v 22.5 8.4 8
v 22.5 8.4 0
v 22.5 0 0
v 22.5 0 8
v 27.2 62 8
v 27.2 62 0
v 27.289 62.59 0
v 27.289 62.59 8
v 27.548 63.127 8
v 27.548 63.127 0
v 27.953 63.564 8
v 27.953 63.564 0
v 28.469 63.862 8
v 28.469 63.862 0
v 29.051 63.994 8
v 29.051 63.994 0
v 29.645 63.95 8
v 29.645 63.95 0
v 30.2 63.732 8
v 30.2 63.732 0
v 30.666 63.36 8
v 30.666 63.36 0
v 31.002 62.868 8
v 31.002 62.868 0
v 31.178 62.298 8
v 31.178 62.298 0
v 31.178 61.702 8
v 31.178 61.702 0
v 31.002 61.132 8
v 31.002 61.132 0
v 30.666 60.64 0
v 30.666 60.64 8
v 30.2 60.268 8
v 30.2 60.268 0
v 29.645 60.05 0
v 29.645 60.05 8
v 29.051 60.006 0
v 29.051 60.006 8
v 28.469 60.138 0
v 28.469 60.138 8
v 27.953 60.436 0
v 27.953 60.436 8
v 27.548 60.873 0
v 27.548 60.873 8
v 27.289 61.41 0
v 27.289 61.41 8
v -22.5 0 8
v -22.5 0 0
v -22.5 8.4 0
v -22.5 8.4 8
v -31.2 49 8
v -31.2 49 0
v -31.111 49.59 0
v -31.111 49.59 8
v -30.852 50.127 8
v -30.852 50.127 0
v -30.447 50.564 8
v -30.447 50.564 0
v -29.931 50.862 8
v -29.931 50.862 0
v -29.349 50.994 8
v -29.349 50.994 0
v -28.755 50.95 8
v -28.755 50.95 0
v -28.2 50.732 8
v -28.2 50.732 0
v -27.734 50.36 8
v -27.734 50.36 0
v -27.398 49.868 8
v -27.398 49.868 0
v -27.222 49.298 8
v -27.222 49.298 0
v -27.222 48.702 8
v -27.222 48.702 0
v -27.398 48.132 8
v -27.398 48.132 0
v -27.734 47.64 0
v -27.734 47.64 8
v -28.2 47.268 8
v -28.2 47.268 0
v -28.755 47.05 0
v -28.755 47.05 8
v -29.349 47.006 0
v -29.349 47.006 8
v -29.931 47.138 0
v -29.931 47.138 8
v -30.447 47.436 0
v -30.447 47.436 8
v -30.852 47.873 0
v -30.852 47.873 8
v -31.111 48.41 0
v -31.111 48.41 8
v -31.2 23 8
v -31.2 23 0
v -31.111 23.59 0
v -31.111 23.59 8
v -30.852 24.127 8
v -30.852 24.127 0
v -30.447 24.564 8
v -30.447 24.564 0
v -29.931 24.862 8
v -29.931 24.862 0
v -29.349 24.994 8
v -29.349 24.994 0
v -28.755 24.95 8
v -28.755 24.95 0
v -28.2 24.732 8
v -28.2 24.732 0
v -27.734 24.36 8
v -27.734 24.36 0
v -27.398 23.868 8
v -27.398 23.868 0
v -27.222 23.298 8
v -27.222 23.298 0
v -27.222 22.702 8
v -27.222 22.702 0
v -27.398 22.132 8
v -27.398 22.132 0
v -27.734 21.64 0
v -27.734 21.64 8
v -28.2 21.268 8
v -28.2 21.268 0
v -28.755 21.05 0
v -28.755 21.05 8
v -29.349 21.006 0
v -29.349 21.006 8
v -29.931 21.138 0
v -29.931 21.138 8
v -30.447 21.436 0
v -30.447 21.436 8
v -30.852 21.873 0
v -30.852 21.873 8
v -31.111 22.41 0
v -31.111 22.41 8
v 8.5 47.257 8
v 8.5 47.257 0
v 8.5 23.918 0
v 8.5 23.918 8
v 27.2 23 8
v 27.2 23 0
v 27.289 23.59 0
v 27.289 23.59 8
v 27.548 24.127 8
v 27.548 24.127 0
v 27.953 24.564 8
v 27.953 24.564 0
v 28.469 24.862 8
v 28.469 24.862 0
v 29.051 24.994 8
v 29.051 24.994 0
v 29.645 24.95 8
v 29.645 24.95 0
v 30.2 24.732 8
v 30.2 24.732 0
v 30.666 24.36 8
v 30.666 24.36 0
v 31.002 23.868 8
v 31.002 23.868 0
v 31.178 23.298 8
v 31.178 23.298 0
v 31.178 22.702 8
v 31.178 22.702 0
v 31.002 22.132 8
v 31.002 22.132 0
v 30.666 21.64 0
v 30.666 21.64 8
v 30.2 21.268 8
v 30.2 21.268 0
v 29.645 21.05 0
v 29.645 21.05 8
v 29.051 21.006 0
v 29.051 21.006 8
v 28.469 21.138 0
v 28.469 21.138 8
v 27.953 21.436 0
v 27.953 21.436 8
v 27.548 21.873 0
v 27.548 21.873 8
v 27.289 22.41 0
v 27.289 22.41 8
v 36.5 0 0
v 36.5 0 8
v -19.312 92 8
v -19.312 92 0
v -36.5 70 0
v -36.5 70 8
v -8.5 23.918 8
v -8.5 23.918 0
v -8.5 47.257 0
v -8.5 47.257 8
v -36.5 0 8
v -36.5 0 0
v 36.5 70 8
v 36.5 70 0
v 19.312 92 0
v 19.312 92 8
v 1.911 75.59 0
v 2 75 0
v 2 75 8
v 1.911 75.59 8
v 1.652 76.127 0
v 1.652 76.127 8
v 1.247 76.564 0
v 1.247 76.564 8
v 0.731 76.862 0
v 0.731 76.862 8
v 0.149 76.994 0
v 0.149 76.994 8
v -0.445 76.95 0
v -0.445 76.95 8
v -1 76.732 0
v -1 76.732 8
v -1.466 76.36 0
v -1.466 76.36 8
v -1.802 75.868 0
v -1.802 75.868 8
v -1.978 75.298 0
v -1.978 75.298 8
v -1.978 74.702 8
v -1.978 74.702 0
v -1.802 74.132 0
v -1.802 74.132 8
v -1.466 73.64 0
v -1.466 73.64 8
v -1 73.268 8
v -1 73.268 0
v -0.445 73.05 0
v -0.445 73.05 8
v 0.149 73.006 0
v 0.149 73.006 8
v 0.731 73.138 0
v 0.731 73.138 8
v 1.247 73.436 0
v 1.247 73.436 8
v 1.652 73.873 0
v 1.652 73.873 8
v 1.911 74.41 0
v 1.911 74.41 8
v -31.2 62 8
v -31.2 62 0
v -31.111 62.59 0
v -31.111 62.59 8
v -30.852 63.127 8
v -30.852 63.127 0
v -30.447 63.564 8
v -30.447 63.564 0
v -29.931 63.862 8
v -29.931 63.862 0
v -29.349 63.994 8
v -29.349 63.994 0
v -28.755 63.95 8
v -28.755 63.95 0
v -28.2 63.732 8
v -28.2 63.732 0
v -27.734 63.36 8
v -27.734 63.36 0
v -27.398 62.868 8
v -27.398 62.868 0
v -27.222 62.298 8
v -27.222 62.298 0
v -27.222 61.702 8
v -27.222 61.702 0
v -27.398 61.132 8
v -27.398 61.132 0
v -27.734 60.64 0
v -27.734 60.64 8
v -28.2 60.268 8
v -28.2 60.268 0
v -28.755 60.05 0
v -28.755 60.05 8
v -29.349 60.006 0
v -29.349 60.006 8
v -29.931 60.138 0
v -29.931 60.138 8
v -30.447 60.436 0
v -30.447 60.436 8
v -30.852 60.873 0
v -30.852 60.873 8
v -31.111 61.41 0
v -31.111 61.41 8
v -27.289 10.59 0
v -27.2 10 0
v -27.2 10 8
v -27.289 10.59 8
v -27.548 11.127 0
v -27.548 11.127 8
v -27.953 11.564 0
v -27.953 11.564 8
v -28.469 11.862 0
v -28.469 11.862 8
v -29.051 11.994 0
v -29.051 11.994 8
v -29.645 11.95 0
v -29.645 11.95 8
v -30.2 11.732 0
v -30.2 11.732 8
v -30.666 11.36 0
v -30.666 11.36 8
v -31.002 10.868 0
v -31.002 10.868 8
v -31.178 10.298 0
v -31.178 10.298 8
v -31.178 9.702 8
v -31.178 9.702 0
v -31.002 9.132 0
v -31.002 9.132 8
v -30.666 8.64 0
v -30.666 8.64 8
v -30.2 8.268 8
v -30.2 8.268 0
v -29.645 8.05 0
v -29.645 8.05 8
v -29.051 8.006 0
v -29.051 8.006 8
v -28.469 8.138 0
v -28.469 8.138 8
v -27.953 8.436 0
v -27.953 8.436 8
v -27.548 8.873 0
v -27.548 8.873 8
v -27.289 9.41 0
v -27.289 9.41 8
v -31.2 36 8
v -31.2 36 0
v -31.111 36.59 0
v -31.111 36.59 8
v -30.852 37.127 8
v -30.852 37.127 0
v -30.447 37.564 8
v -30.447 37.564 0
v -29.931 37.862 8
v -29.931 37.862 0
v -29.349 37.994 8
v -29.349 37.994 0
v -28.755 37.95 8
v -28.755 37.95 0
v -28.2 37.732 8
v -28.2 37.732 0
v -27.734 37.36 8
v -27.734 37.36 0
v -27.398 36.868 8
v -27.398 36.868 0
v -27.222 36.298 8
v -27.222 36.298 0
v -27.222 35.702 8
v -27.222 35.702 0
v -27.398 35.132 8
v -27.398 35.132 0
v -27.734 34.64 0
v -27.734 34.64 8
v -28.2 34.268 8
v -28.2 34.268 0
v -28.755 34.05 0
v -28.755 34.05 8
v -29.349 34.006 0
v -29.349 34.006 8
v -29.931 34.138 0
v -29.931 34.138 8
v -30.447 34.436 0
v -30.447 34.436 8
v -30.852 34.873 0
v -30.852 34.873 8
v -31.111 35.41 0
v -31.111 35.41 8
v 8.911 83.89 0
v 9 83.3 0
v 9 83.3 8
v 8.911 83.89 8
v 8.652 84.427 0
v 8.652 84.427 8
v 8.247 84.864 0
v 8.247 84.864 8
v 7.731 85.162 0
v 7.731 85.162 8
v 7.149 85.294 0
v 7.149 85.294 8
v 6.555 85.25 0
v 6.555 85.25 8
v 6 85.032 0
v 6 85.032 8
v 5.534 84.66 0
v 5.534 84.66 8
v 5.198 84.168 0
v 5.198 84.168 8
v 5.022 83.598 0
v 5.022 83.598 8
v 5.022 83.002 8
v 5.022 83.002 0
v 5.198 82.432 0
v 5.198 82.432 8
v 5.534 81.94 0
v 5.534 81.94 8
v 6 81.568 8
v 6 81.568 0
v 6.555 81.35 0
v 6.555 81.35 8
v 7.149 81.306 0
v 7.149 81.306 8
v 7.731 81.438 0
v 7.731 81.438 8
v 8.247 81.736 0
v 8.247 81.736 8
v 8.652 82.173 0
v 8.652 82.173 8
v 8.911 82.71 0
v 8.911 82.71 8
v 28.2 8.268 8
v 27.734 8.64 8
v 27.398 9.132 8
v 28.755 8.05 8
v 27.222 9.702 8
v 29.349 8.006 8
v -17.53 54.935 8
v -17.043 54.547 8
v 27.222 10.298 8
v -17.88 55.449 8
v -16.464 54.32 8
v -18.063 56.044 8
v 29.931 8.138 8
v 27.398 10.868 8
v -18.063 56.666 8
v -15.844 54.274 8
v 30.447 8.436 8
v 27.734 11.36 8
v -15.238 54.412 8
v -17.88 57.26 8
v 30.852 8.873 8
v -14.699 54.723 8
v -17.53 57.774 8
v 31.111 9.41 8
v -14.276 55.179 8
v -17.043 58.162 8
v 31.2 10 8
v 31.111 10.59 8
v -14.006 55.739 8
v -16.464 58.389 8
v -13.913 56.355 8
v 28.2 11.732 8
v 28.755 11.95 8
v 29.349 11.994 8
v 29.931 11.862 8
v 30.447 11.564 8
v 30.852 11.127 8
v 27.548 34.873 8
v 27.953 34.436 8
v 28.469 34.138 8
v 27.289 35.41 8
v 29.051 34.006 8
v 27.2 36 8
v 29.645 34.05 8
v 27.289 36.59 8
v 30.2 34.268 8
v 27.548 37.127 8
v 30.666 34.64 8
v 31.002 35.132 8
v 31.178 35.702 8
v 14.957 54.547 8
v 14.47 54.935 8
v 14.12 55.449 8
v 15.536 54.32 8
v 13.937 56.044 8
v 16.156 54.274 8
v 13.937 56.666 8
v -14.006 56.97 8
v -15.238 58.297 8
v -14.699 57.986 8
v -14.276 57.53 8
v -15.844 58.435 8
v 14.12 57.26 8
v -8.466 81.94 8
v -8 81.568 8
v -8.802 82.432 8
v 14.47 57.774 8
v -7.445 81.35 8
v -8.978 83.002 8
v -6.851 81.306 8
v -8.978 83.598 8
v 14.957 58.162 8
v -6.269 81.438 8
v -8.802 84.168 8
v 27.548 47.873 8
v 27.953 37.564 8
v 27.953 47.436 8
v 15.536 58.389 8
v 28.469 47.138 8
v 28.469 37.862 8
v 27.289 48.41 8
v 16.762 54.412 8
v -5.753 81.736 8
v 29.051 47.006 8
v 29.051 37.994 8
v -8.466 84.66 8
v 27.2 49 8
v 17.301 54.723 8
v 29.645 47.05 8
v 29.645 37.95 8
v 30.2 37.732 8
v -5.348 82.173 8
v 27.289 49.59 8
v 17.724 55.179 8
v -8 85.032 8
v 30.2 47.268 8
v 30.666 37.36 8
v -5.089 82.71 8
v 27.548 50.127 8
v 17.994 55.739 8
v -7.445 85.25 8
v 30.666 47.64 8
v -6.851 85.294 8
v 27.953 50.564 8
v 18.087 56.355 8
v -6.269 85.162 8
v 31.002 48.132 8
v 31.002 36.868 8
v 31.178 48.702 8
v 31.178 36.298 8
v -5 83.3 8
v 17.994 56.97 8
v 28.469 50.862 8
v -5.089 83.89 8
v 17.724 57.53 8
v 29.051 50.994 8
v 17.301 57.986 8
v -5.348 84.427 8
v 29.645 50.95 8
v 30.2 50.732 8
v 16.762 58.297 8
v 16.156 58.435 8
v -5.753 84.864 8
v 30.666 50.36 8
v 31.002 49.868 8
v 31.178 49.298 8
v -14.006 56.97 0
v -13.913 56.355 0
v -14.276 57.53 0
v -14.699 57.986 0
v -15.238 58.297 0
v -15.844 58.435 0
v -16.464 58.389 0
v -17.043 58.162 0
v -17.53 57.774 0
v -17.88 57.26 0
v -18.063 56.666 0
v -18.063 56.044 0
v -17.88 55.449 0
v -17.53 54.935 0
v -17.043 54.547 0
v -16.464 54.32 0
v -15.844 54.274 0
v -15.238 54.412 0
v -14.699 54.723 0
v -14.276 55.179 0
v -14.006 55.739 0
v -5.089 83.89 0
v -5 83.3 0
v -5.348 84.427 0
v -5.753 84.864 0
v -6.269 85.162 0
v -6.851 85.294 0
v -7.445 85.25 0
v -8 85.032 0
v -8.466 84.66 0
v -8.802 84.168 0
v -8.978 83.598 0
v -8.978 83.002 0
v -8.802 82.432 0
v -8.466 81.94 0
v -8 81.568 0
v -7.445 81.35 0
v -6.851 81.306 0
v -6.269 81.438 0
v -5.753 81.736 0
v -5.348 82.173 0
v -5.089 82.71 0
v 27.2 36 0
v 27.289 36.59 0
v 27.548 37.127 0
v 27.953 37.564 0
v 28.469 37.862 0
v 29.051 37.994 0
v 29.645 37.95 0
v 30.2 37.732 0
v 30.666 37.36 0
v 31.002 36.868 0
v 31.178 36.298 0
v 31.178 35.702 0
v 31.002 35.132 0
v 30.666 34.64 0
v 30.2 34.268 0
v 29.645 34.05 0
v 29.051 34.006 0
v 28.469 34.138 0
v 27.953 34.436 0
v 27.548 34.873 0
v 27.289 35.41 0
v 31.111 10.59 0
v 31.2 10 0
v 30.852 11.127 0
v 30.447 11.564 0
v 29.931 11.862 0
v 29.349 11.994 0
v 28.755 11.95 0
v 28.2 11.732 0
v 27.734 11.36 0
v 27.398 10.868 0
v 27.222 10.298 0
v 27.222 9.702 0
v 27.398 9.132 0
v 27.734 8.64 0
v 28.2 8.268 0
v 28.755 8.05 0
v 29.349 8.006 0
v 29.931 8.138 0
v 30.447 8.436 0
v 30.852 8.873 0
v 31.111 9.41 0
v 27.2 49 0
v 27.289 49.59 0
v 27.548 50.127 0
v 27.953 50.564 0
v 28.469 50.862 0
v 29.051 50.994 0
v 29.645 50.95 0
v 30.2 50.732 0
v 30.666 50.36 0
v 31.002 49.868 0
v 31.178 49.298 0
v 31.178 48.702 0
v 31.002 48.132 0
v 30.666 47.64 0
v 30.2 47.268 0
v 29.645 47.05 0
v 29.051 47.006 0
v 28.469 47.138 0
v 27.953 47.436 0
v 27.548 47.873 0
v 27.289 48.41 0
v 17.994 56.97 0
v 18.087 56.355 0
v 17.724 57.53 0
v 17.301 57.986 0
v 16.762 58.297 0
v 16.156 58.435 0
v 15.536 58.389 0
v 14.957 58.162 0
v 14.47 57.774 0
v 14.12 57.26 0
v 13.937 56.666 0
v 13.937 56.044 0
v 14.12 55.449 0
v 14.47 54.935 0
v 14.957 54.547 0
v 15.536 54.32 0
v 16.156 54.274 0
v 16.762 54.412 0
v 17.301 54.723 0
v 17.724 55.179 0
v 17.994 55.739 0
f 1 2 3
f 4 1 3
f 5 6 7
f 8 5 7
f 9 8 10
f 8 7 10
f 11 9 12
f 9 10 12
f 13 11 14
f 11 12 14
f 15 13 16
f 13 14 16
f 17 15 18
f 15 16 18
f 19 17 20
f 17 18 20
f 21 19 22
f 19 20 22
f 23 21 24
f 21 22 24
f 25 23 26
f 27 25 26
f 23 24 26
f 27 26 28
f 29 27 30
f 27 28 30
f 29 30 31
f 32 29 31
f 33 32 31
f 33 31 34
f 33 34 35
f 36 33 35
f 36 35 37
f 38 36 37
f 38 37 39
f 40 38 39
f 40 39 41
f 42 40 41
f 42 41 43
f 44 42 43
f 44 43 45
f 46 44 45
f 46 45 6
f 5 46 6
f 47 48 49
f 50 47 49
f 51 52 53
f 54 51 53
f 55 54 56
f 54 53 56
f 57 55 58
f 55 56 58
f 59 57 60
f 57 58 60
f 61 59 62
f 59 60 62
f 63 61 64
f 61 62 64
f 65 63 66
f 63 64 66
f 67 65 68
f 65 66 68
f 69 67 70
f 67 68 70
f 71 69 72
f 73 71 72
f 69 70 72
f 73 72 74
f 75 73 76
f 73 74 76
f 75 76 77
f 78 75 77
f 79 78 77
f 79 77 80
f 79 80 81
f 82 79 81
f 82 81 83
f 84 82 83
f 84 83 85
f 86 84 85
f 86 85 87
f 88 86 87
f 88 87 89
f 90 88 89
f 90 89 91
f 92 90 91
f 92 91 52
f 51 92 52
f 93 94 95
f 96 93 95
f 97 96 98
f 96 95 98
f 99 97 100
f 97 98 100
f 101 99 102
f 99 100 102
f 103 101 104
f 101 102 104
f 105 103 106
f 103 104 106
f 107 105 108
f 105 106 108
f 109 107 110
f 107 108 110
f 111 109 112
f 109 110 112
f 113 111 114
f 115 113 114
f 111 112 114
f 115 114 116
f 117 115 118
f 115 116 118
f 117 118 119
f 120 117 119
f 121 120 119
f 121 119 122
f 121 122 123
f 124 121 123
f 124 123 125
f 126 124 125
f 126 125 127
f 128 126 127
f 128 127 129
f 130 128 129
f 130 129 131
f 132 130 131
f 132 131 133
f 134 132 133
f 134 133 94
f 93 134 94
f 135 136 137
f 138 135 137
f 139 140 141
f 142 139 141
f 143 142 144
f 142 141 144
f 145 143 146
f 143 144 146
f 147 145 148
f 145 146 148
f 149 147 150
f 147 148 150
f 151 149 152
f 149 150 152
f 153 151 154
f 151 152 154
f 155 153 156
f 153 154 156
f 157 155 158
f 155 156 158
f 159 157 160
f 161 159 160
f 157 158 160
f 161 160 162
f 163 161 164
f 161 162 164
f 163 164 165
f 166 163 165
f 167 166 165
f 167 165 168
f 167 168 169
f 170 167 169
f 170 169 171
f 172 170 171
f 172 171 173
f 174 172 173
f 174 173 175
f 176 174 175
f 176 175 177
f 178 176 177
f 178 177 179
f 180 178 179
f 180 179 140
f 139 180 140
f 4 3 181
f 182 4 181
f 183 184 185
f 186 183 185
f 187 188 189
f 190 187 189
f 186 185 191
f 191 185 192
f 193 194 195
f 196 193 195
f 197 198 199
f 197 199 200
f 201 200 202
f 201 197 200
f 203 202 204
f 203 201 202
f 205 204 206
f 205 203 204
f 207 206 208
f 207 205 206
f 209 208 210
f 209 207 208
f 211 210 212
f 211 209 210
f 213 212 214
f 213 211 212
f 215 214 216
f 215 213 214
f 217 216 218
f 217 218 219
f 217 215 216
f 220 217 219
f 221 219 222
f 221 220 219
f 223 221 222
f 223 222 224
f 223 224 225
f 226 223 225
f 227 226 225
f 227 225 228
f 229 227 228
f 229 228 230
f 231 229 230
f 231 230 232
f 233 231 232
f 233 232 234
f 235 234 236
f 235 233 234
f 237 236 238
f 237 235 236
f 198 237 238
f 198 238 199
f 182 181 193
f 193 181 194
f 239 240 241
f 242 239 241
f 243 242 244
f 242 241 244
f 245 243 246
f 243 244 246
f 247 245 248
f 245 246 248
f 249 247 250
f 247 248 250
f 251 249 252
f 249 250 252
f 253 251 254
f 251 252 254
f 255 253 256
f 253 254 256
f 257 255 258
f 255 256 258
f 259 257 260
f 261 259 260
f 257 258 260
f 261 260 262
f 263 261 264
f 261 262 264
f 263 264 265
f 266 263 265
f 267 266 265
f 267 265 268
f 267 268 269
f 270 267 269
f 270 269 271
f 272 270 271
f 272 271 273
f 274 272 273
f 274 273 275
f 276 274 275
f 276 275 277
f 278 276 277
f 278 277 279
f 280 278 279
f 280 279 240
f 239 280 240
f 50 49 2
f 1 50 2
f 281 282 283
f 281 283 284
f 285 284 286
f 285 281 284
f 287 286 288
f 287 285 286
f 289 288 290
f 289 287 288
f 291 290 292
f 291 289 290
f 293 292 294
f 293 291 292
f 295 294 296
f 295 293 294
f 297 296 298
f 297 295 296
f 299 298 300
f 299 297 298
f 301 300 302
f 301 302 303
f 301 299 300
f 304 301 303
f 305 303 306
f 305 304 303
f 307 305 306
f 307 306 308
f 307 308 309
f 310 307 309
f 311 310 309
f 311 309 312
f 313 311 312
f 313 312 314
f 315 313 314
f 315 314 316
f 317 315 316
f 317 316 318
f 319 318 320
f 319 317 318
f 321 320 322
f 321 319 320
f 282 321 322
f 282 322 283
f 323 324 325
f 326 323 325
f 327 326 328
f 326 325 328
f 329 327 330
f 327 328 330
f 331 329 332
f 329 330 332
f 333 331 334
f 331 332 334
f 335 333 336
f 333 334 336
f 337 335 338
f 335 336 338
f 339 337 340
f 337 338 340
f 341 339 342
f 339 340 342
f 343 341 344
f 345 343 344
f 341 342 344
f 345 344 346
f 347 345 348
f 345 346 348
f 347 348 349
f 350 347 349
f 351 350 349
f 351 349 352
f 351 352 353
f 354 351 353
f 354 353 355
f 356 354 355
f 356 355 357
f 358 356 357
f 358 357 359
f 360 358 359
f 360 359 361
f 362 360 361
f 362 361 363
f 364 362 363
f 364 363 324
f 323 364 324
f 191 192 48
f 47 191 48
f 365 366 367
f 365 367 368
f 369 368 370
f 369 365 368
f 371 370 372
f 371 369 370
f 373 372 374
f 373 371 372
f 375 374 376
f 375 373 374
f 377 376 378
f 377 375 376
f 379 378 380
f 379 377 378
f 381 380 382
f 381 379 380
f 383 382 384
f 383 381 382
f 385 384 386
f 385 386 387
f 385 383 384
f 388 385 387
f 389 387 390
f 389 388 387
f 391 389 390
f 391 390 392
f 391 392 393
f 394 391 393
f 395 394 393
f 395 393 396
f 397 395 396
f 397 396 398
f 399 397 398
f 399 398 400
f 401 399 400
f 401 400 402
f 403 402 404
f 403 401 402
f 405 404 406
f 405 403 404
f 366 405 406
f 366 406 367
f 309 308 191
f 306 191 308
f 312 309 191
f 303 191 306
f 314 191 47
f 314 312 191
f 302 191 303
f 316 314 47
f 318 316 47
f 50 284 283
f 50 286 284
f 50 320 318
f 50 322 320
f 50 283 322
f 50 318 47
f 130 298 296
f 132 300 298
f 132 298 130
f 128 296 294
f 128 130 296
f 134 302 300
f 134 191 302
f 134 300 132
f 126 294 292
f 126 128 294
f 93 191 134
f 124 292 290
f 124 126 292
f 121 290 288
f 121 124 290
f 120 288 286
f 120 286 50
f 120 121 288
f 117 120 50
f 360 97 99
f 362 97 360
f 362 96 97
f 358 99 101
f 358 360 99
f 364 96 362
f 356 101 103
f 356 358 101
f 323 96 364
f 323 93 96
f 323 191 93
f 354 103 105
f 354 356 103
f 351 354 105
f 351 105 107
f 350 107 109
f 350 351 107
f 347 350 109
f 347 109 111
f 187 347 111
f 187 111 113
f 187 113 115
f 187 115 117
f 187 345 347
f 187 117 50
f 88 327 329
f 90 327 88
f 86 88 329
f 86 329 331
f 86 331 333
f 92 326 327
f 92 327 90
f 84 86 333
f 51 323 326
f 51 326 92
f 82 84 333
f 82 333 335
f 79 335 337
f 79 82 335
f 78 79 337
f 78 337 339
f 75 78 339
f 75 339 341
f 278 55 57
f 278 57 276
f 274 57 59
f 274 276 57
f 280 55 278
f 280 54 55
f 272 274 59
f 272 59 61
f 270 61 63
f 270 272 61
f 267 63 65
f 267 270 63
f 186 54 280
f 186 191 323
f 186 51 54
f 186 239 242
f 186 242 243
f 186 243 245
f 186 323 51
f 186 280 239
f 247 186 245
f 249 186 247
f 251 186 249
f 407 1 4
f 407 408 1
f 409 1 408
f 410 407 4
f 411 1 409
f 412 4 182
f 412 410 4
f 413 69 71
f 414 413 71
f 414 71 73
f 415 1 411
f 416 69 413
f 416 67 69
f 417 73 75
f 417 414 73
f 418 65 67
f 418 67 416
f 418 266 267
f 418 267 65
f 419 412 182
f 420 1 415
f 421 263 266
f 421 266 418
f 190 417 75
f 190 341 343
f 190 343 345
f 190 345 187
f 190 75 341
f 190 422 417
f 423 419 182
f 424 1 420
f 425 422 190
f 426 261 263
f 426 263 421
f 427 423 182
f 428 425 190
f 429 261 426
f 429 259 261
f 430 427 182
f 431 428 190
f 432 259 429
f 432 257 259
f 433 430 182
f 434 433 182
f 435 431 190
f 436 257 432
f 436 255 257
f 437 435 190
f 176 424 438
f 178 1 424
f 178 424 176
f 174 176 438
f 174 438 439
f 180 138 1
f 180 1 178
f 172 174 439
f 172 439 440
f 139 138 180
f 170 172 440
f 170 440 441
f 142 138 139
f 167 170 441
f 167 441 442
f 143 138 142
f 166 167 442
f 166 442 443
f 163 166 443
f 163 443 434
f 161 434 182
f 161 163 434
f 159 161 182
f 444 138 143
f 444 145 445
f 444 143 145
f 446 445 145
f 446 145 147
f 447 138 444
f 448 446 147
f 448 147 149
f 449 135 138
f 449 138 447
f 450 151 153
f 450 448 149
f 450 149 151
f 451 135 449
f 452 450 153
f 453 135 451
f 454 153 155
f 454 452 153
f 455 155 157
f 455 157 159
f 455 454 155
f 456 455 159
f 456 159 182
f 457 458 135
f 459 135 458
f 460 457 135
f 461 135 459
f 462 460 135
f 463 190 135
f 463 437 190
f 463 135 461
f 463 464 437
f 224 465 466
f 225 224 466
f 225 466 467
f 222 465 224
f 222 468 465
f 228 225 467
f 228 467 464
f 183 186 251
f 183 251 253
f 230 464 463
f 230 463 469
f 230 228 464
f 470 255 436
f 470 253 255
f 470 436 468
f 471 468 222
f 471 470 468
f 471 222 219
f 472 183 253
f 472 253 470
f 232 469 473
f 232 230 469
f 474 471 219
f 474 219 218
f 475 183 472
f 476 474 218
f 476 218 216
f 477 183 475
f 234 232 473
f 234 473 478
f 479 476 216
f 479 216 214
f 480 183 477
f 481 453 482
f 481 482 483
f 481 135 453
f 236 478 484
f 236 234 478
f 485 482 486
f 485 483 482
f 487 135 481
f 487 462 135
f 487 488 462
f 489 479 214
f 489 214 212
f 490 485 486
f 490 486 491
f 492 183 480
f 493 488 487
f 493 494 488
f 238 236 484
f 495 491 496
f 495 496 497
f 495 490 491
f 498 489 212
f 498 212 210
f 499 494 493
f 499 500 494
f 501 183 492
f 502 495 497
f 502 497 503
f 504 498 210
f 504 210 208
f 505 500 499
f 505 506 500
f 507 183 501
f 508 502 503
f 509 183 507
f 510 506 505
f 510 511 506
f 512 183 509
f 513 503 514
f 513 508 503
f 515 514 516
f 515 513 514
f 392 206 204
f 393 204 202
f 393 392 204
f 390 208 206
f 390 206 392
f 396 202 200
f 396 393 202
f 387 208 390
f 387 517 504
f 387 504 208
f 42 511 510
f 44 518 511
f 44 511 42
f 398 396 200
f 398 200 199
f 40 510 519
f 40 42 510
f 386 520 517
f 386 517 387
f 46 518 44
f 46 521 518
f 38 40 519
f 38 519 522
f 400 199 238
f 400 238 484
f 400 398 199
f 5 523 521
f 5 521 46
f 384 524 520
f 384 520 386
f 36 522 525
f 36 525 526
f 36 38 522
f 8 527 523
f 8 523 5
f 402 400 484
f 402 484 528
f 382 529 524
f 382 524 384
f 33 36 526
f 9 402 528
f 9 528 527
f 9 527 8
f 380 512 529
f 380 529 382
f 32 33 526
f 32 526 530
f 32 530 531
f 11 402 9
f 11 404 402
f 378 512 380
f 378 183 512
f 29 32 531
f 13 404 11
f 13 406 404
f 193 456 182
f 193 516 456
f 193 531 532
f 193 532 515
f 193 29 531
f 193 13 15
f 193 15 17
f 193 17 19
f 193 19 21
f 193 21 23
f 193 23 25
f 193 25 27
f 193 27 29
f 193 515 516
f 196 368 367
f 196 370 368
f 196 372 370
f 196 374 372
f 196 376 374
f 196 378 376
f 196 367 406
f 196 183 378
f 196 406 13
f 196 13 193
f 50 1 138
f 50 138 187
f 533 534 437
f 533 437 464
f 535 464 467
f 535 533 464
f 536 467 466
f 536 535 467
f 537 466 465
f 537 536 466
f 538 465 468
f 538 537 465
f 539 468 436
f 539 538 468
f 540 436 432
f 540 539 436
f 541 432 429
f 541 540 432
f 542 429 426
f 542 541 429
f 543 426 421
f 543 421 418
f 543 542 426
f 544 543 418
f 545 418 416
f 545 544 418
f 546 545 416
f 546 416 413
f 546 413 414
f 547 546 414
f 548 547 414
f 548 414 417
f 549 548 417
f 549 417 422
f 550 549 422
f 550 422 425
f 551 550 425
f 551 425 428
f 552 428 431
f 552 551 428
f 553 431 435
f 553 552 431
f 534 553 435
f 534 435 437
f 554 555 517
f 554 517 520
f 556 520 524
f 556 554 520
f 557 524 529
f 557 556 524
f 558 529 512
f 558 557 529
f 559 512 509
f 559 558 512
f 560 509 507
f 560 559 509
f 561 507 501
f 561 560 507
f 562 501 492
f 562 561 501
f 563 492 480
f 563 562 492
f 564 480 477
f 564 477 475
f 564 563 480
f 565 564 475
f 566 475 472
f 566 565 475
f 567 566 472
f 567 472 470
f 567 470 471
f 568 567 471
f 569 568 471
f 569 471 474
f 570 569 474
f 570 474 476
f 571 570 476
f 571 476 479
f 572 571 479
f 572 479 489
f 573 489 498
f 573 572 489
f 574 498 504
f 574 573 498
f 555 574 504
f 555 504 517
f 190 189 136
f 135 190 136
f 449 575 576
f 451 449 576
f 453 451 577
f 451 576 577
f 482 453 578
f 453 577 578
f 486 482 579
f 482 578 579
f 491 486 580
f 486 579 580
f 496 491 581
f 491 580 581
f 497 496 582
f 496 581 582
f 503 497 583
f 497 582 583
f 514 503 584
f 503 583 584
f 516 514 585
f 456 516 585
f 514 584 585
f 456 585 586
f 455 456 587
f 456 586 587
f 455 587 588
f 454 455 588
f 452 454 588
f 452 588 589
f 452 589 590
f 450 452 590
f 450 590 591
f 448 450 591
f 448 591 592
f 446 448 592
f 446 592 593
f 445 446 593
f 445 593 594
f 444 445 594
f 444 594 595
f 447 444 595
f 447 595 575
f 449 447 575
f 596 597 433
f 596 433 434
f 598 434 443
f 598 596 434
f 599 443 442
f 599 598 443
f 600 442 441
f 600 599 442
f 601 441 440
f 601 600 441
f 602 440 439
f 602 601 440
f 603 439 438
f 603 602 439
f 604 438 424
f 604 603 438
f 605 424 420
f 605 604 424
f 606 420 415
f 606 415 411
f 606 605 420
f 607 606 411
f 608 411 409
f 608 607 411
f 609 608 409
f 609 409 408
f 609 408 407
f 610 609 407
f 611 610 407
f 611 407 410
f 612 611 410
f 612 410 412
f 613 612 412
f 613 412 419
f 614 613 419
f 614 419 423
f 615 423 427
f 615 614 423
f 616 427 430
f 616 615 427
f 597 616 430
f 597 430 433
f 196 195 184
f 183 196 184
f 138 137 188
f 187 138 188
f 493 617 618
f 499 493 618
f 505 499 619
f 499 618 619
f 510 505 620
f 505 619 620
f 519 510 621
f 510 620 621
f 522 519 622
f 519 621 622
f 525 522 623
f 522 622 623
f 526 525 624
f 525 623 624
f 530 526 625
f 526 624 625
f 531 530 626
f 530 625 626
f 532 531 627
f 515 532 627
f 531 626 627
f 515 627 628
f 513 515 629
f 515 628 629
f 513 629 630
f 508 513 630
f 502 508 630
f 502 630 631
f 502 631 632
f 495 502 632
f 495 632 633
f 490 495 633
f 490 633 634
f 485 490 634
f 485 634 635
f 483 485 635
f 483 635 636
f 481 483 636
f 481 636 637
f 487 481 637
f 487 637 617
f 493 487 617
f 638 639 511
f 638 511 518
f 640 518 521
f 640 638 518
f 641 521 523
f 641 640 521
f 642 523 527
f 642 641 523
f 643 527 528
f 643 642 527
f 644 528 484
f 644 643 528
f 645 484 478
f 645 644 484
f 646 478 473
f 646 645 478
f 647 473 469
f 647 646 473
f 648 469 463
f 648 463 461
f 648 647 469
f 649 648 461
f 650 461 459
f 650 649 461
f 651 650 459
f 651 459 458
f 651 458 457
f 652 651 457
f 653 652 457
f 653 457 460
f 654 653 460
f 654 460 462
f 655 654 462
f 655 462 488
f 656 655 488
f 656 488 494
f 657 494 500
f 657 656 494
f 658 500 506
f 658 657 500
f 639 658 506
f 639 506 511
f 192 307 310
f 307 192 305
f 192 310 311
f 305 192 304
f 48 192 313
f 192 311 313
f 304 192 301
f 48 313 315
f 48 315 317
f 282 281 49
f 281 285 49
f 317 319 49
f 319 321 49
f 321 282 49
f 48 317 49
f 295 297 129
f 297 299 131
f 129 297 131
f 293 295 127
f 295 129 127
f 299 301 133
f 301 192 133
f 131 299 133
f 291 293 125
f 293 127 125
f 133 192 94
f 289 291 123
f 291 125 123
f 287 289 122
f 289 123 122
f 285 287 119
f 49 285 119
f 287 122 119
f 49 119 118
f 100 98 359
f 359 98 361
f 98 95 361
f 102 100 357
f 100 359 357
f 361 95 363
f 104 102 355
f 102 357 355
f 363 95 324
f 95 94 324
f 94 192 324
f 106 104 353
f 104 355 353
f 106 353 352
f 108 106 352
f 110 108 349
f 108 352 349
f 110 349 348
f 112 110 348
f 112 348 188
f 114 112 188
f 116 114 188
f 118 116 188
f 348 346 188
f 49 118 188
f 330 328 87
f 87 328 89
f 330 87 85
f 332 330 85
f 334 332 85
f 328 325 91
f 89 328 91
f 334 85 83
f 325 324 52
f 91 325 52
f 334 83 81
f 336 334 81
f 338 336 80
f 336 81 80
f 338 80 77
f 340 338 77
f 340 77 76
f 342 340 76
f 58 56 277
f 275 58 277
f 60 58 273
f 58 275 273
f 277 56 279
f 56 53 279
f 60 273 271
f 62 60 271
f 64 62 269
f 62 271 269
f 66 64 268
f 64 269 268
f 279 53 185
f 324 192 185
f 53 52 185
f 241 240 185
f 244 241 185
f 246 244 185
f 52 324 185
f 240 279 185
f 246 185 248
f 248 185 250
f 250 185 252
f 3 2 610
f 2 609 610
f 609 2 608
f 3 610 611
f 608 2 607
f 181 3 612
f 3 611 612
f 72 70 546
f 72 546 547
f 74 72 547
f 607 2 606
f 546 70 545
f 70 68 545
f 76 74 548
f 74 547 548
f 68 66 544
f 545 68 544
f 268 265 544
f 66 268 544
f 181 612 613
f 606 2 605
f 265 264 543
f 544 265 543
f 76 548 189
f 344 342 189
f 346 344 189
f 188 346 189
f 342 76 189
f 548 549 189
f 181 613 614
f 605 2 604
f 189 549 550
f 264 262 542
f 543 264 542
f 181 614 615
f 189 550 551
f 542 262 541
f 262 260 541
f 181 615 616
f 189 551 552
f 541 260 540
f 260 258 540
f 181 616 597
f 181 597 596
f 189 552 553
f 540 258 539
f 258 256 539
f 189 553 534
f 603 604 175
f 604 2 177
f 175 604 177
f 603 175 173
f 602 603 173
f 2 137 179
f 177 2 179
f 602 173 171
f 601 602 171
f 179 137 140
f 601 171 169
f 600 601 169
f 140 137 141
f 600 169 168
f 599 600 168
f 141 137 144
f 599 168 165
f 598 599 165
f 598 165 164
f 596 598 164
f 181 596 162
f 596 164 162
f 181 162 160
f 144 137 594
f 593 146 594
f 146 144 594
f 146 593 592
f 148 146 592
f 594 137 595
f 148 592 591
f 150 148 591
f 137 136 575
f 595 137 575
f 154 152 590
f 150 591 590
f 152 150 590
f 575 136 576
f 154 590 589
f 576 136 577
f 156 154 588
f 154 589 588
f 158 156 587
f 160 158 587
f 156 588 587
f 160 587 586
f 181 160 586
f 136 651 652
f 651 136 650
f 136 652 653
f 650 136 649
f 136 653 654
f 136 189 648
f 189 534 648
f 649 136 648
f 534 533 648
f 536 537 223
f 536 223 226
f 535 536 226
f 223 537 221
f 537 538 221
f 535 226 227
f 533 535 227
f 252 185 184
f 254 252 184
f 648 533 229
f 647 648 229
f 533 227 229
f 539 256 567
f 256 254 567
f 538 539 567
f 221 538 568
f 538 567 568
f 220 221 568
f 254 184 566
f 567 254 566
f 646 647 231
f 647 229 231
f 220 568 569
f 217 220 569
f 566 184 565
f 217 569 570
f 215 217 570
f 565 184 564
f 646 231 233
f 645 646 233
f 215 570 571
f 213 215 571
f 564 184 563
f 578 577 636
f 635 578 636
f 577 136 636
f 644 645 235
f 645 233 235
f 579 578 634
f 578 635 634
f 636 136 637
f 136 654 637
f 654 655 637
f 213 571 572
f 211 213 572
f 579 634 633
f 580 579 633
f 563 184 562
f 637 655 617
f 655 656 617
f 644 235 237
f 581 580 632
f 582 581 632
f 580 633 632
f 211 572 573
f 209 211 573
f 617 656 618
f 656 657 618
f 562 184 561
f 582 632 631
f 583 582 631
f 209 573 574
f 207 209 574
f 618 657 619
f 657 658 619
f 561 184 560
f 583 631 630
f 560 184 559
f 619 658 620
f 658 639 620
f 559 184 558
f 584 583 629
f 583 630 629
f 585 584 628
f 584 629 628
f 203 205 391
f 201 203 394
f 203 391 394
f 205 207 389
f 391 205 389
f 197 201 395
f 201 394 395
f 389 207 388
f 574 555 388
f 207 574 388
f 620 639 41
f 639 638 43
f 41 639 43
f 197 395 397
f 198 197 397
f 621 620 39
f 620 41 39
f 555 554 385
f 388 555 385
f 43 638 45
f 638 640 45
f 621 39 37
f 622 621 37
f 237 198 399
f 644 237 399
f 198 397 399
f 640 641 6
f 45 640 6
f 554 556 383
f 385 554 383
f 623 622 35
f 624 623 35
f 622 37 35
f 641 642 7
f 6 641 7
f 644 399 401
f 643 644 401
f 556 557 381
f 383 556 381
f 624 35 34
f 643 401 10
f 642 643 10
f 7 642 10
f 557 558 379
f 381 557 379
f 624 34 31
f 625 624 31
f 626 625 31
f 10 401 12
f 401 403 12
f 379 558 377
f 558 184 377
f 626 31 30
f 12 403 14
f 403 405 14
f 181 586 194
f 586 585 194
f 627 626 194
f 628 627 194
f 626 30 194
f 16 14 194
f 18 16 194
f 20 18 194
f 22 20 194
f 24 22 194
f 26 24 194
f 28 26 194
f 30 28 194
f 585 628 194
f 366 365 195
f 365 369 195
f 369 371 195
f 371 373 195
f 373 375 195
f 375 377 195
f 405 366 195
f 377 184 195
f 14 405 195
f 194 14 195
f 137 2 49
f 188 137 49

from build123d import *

# Parameters (mm, degrees)
ESBO_O1_R                = 2
ESBO_O1_R_2              = 2.086716092
ESBO_O1_R_3              = 2.086717953
RESSALTO_EXTRUS_O1_DEPTH = 8
ESBO_O2_R                = 2
CORTE_EXTRUS_O1_DEPTH    = 9


with BuildPart() as part:
    # Esboço1 → Ressalto-extrusão1 (new body)
    with BuildSketch(Plane.XY):
        Polygon((19.311716217, 92), (-19.311716217, 92), (-36.5, 70), (-36.5, 0), (-22.499999998, 0), (-22.499999998, 8.400000004), (22.499999998, 8.400000004), (22.499999998, 0), (36.5, 0), (36.5, 70), align=None)
        with Locations((0, 75)):
            Circle(ESBO_O1_R, mode=Mode.SUBTRACT)
        with Locations((-7, 83.3)):
            Circle(ESBO_O1_R, mode=Mode.SUBTRACT)
        with Locations((7, 83.3)):
            Circle(ESBO_O1_R, mode=Mode.SUBTRACT)
        with Locations((-29.2, 10)):
            Circle(ESBO_O1_R, mode=Mode.SUBTRACT)
        with Locations((29.2, 10)):
            Circle(ESBO_O1_R, mode=Mode.SUBTRACT)
        with Locations((-16, 56.354540575)):
            Circle(ESBO_O1_R_2, mode=Mode.SUBTRACT)
        with Locations((16, 56.354540575)):
            Circle(ESBO_O1_R_3, mode=Mode.SUBTRACT)
        Polygon((0, 47.257129716), (8.5, 47.257129716), (8.5, 23.917682695), (0, 23.917682695), (-8.5, 23.917682695), (-8.5, 47.257129716), align=None, mode=Mode.SUBTRACT)
    extrude(amount=RESSALTO_EXTRUS_O1_DEPTH)

    # Esboço2 → Corte-extrusão1 (cut, through all)
    with BuildSketch(Plane(origin=(0, 0, 0), x_dir=(-1, 0, 0), z_dir=(0, 0, -1))):
        with Locations((29.2, 23)):
            Circle(ESBO_O2_R)
        with Locations((29.2, 36)):
            Circle(ESBO_O2_R)
        with Locations((29.2, 49)):
            Circle(ESBO_O2_R)
        with Locations((29.2, 62)):
            Circle(ESBO_O2_R)
        with Locations((-29.2, 49)):
            Circle(ESBO_O2_R)
        with Locations((-29.2, 36)):
            Circle(ESBO_O2_R)
        with Locations((-29.2, 62)):
            Circle(ESBO_O2_R)
        with Locations((-29.2, 23)):
            Circle(ESBO_O2_R)
    extrude(amount=-CORTE_EXTRUS_O1_DEPTH, mode=Mode.SUBTRACT)


solid = part.part
